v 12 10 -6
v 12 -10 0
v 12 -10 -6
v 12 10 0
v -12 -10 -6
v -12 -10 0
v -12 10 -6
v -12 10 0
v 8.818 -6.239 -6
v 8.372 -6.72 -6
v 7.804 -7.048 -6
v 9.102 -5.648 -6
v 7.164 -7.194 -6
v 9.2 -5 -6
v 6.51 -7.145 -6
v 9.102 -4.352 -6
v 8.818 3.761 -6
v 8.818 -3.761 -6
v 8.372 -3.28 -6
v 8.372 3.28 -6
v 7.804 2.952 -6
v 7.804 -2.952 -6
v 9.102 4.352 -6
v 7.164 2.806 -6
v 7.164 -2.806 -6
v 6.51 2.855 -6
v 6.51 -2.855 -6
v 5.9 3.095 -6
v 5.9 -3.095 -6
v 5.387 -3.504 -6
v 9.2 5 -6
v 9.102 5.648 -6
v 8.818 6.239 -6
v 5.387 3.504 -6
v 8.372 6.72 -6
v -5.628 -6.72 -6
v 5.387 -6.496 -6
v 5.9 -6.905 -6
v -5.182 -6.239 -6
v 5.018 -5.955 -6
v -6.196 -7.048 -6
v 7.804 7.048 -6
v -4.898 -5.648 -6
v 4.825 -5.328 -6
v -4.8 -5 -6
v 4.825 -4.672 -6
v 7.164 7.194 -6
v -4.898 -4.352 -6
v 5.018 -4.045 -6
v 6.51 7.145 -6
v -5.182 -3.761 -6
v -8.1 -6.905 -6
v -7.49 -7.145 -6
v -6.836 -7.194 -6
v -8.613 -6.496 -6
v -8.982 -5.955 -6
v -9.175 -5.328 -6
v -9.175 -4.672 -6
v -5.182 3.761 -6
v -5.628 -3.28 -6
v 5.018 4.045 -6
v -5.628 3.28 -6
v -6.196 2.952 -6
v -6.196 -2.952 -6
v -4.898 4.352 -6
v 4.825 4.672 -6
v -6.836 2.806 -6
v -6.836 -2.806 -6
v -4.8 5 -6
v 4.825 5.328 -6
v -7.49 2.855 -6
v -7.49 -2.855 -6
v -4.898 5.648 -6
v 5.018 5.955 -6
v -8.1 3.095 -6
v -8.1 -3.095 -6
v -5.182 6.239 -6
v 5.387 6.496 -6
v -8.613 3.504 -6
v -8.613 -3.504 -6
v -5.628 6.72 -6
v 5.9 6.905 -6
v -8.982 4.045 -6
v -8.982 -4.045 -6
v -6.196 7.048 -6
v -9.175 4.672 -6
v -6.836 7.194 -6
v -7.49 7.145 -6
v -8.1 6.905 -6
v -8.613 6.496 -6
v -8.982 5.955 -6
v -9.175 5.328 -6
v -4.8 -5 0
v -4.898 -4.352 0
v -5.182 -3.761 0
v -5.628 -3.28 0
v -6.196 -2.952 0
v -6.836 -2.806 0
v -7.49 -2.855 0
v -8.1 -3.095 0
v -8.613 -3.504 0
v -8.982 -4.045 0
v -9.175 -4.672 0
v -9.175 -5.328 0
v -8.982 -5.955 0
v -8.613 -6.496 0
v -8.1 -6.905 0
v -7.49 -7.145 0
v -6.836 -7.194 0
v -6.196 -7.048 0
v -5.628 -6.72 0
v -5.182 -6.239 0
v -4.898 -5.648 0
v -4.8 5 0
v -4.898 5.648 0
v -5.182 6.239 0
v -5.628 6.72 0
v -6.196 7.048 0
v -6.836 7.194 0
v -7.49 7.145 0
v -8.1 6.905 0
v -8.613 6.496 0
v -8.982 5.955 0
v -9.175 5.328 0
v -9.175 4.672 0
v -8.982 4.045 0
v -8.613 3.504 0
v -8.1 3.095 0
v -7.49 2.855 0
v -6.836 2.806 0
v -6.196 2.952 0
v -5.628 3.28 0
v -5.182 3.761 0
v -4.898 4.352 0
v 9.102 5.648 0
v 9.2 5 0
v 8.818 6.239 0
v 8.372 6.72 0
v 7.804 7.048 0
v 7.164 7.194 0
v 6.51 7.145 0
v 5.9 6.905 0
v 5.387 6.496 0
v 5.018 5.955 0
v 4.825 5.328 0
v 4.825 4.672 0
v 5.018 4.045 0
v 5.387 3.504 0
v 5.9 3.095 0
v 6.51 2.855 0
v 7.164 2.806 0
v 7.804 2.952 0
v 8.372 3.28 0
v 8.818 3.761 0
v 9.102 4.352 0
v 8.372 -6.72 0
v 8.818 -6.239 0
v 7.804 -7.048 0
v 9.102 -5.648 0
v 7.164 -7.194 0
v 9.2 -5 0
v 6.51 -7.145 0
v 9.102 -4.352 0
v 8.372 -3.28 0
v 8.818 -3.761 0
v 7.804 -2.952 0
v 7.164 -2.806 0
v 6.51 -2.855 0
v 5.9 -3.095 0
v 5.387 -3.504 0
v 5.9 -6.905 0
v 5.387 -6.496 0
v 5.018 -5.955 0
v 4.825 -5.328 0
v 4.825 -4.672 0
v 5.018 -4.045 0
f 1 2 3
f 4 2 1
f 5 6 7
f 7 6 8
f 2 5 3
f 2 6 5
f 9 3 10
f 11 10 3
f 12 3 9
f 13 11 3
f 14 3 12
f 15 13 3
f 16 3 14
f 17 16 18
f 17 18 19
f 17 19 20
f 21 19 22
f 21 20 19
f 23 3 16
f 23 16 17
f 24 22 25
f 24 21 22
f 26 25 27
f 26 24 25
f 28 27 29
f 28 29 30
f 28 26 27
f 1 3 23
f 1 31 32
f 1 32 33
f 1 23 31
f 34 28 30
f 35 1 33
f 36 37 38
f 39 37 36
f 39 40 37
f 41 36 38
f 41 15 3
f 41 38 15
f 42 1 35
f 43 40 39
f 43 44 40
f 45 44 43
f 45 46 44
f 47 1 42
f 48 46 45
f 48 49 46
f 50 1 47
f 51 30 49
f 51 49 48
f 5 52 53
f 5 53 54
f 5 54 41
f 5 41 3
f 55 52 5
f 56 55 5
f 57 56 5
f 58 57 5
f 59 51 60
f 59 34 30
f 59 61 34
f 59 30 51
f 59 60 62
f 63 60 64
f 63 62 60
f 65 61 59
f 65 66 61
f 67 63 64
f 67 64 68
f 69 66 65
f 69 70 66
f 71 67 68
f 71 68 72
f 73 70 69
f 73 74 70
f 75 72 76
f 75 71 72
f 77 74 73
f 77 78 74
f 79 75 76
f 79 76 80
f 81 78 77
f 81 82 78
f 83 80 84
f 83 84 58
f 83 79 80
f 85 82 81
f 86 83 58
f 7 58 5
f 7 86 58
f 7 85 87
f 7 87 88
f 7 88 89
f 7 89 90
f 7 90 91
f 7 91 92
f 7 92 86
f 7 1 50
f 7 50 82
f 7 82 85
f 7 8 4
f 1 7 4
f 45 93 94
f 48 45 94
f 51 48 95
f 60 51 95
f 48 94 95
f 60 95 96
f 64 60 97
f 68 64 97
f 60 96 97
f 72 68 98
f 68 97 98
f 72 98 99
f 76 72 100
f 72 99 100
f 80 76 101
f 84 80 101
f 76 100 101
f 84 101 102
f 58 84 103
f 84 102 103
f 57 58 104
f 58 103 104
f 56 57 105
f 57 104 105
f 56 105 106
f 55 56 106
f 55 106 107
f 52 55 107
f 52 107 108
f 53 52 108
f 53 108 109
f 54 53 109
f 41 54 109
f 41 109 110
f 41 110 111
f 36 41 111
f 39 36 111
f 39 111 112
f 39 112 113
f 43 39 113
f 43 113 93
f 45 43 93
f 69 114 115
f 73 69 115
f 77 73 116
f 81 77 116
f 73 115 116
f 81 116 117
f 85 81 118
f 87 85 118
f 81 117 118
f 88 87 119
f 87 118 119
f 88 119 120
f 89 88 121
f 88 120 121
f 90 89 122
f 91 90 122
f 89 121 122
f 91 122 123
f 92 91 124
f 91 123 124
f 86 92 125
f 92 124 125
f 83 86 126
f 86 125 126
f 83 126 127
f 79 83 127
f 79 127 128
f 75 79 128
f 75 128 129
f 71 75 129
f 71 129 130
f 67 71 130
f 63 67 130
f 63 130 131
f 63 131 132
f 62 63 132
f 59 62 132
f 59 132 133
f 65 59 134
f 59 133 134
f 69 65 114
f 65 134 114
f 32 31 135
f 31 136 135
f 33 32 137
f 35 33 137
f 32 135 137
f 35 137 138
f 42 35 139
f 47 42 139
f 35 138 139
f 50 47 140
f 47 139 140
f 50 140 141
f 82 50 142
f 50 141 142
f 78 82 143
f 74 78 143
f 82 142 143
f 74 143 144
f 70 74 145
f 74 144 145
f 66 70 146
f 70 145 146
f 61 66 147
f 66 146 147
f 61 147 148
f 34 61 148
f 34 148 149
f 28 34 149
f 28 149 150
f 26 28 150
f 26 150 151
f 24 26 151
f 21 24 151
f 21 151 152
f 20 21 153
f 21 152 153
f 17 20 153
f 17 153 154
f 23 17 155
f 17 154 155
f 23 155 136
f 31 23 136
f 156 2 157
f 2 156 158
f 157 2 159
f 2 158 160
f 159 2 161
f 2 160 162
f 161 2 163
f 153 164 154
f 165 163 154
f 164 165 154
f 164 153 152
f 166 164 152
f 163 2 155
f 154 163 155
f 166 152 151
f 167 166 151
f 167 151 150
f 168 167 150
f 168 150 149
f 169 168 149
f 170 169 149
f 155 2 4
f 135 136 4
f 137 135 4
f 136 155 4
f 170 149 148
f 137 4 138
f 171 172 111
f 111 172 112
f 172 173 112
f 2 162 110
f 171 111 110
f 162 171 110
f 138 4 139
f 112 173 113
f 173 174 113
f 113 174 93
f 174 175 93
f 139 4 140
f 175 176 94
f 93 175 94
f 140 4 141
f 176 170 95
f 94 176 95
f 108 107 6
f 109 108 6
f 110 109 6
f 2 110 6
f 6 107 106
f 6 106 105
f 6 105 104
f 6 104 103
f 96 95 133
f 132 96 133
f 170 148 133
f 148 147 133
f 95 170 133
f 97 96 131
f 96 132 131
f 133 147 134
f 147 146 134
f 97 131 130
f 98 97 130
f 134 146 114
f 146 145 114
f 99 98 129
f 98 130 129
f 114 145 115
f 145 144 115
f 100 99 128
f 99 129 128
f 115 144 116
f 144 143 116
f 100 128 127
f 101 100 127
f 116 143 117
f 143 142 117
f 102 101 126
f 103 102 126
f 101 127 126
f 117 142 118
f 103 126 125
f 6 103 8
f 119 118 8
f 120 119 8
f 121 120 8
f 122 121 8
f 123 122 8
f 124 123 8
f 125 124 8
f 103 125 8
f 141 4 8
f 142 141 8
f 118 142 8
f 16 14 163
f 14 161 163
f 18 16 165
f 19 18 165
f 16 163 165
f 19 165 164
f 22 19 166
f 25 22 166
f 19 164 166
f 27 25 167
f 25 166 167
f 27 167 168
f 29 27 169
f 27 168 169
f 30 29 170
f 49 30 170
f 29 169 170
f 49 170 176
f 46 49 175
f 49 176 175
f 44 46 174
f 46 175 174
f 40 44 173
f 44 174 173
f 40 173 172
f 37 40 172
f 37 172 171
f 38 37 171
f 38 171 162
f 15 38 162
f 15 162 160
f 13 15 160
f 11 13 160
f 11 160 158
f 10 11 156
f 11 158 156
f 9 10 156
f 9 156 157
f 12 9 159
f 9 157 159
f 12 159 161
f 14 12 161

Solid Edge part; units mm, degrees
sketch "Sketch1" plane through (0, 0, 0) normal (0, 0, 1) x (1, 0, 0)
  line L0 (-12, 10) -> (12, 10)
  line L1 (12, -10) -> (12, 10)
  line L2 (-12, -10) -> (12, -10)
  line L3 (-12, -10) -> (-12, 10)
  circle A0 centre (-7, 5) radius 2.2
  circle A1 centre (-7, -5) radius 2.2
  circle A2 centre (7, -5) radius 2.2
  circle A3 centre (7, 5) radius 2.2
extrude "Protrusion1" add sketch "Sketch1" against normal blind 6
